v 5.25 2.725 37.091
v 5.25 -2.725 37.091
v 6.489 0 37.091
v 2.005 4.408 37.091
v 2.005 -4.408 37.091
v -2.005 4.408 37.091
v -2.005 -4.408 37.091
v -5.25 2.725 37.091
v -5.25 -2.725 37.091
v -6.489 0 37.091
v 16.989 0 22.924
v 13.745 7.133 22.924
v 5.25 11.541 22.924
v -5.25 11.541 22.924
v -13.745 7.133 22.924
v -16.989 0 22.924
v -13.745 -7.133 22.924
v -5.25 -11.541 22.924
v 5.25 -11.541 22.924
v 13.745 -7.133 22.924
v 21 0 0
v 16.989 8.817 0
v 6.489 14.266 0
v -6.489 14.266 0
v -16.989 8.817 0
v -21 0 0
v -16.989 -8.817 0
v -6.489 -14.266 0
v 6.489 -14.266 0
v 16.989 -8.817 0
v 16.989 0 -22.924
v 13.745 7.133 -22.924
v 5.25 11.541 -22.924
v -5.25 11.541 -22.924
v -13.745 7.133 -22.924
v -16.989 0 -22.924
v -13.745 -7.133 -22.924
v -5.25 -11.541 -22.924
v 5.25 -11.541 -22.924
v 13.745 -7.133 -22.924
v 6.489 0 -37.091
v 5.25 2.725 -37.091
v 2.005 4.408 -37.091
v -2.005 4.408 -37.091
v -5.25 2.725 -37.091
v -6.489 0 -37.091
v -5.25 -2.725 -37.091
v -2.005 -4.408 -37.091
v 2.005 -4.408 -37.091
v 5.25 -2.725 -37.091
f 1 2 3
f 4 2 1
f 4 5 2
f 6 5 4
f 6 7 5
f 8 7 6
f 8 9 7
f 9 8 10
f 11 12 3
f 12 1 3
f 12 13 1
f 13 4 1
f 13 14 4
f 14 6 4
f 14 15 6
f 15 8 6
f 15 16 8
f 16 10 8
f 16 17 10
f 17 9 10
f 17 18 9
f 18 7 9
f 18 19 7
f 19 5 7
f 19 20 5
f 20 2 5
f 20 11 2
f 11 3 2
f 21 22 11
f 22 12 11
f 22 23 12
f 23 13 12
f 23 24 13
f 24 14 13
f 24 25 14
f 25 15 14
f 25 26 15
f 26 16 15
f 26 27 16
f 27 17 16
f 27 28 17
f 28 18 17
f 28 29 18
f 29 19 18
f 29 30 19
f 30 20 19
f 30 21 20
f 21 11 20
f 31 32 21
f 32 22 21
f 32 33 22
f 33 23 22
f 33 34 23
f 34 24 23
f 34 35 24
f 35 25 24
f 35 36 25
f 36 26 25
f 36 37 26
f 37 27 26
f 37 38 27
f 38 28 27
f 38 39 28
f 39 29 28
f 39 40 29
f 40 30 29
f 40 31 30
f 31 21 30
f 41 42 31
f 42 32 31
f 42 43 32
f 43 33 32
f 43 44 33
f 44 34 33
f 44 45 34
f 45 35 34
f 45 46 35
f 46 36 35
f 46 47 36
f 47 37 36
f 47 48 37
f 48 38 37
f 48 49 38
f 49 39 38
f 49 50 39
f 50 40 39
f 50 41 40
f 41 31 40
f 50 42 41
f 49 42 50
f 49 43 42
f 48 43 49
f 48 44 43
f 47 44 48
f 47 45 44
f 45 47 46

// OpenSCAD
// Generated by SolidPython 1.0.1 on 2020-07-29 00:46:47


scale(v = [7, 5, 13]) {
	sphere(r = 3);
}
/***********************************************
*********      SolidPython code:      **********
************************************************
 
# import packages: SolidPython
from solid import *
from solid.utils import *
from itertools import chain, combinations, permutations


class Resize:

    def __init__(self, scad_file):
        self.scad_file = scad_file
        #self.scad_file = import_scad(scad_file)
        # cone/cylinder param:
        self.r1 = 0
        self.r2 = 0
        self.h = 0
        # rectangular prism param:
        self.w = 0
        self.l = 0
        # ellipse param:
        self.r = 0

    # import OpenScad code (file name corresponds to shape)


    # classify shape + parameters
    def assign(self, param1, param2, param3):
        if self.scad_file == 'cone.scad':
            self.r1 = param1
            self.r2 = param2
            self.h = param3
        elif self.scad_file == 'cylinder.scad':
            self.r1 = param1
            self.r2 = param2
            self.h = param3
        elif self.scad_file == 'rectangularPrism.scad':
            self.h = param1
            self.l = param2
            self.w = param3
        else:
            self.r = param1
            self.h = param2

    # resize parameters
    def iterate(self):
        x = range(3, 20, 2)
        i = 1
        if self.scad_file == 'cone.scad':
            tempList = list(permutations(x, 2))
            for temp in tempList:
                param1 = temp[0]
                param2 = temp[1]
                filepath = 'produced_scad_files/' + 'cone' + str(param1) + '_' + str(param2) + '_' + '.scad'
                scad_render_to_file(cylinder(h=param1, r1=param2, r2=0), filepath)

        elif self.scad_file == 'cylinder.scad':
            tempList = list(permutations(x, 3))
            for temp in tempList:
                param1 = temp[0]
                param2 = temp[1]
                filepath = 'produced_scad_files/' + 'cylinder' + str(param1) + '_' + str(param2) + '_' + '.scad'
                scad_render_to_file(cylinder(h=param1, r1=param2, r2=param2), filepath)

        elif self.scad_file == 'rectangularPrism.scad':
            tempList = list(permutations(x, 3))
            for temp in tempList:
                param1 = temp[0]
                param2 = temp[1]
                param3 = temp[2]
                filepath = 'produced_scad_files/' + 'rectangularPrism' + str(param1) + '_' + str(param2) + '_' + str(
                    param3) + '.scad'
                scad_render_to_file(cube(size=(param1, param2, param3)), filepath)

        elif self.scad_file == 'ellipse.scad':
            tempList = list(permutations(x, 4))
            for temp in tempList:
                param1 = temp[0]
                param2 = temp[1]
                param3 = temp[2]
                param4 = temp[3]
                filepath = 'produced_scad_files/' + 'ellipse' + str(param1) + '_' + str(param2) + '_' + str(param3) + '_' + str(param4) + '.scad'
                scad_render_to_file(scale([param1, param2, param3])(sphere(r=param4)), filepath)

    def render_to_scadfile(self):
        scad_render_to_file(scad, 'example.scad') 
 
************************************************/
